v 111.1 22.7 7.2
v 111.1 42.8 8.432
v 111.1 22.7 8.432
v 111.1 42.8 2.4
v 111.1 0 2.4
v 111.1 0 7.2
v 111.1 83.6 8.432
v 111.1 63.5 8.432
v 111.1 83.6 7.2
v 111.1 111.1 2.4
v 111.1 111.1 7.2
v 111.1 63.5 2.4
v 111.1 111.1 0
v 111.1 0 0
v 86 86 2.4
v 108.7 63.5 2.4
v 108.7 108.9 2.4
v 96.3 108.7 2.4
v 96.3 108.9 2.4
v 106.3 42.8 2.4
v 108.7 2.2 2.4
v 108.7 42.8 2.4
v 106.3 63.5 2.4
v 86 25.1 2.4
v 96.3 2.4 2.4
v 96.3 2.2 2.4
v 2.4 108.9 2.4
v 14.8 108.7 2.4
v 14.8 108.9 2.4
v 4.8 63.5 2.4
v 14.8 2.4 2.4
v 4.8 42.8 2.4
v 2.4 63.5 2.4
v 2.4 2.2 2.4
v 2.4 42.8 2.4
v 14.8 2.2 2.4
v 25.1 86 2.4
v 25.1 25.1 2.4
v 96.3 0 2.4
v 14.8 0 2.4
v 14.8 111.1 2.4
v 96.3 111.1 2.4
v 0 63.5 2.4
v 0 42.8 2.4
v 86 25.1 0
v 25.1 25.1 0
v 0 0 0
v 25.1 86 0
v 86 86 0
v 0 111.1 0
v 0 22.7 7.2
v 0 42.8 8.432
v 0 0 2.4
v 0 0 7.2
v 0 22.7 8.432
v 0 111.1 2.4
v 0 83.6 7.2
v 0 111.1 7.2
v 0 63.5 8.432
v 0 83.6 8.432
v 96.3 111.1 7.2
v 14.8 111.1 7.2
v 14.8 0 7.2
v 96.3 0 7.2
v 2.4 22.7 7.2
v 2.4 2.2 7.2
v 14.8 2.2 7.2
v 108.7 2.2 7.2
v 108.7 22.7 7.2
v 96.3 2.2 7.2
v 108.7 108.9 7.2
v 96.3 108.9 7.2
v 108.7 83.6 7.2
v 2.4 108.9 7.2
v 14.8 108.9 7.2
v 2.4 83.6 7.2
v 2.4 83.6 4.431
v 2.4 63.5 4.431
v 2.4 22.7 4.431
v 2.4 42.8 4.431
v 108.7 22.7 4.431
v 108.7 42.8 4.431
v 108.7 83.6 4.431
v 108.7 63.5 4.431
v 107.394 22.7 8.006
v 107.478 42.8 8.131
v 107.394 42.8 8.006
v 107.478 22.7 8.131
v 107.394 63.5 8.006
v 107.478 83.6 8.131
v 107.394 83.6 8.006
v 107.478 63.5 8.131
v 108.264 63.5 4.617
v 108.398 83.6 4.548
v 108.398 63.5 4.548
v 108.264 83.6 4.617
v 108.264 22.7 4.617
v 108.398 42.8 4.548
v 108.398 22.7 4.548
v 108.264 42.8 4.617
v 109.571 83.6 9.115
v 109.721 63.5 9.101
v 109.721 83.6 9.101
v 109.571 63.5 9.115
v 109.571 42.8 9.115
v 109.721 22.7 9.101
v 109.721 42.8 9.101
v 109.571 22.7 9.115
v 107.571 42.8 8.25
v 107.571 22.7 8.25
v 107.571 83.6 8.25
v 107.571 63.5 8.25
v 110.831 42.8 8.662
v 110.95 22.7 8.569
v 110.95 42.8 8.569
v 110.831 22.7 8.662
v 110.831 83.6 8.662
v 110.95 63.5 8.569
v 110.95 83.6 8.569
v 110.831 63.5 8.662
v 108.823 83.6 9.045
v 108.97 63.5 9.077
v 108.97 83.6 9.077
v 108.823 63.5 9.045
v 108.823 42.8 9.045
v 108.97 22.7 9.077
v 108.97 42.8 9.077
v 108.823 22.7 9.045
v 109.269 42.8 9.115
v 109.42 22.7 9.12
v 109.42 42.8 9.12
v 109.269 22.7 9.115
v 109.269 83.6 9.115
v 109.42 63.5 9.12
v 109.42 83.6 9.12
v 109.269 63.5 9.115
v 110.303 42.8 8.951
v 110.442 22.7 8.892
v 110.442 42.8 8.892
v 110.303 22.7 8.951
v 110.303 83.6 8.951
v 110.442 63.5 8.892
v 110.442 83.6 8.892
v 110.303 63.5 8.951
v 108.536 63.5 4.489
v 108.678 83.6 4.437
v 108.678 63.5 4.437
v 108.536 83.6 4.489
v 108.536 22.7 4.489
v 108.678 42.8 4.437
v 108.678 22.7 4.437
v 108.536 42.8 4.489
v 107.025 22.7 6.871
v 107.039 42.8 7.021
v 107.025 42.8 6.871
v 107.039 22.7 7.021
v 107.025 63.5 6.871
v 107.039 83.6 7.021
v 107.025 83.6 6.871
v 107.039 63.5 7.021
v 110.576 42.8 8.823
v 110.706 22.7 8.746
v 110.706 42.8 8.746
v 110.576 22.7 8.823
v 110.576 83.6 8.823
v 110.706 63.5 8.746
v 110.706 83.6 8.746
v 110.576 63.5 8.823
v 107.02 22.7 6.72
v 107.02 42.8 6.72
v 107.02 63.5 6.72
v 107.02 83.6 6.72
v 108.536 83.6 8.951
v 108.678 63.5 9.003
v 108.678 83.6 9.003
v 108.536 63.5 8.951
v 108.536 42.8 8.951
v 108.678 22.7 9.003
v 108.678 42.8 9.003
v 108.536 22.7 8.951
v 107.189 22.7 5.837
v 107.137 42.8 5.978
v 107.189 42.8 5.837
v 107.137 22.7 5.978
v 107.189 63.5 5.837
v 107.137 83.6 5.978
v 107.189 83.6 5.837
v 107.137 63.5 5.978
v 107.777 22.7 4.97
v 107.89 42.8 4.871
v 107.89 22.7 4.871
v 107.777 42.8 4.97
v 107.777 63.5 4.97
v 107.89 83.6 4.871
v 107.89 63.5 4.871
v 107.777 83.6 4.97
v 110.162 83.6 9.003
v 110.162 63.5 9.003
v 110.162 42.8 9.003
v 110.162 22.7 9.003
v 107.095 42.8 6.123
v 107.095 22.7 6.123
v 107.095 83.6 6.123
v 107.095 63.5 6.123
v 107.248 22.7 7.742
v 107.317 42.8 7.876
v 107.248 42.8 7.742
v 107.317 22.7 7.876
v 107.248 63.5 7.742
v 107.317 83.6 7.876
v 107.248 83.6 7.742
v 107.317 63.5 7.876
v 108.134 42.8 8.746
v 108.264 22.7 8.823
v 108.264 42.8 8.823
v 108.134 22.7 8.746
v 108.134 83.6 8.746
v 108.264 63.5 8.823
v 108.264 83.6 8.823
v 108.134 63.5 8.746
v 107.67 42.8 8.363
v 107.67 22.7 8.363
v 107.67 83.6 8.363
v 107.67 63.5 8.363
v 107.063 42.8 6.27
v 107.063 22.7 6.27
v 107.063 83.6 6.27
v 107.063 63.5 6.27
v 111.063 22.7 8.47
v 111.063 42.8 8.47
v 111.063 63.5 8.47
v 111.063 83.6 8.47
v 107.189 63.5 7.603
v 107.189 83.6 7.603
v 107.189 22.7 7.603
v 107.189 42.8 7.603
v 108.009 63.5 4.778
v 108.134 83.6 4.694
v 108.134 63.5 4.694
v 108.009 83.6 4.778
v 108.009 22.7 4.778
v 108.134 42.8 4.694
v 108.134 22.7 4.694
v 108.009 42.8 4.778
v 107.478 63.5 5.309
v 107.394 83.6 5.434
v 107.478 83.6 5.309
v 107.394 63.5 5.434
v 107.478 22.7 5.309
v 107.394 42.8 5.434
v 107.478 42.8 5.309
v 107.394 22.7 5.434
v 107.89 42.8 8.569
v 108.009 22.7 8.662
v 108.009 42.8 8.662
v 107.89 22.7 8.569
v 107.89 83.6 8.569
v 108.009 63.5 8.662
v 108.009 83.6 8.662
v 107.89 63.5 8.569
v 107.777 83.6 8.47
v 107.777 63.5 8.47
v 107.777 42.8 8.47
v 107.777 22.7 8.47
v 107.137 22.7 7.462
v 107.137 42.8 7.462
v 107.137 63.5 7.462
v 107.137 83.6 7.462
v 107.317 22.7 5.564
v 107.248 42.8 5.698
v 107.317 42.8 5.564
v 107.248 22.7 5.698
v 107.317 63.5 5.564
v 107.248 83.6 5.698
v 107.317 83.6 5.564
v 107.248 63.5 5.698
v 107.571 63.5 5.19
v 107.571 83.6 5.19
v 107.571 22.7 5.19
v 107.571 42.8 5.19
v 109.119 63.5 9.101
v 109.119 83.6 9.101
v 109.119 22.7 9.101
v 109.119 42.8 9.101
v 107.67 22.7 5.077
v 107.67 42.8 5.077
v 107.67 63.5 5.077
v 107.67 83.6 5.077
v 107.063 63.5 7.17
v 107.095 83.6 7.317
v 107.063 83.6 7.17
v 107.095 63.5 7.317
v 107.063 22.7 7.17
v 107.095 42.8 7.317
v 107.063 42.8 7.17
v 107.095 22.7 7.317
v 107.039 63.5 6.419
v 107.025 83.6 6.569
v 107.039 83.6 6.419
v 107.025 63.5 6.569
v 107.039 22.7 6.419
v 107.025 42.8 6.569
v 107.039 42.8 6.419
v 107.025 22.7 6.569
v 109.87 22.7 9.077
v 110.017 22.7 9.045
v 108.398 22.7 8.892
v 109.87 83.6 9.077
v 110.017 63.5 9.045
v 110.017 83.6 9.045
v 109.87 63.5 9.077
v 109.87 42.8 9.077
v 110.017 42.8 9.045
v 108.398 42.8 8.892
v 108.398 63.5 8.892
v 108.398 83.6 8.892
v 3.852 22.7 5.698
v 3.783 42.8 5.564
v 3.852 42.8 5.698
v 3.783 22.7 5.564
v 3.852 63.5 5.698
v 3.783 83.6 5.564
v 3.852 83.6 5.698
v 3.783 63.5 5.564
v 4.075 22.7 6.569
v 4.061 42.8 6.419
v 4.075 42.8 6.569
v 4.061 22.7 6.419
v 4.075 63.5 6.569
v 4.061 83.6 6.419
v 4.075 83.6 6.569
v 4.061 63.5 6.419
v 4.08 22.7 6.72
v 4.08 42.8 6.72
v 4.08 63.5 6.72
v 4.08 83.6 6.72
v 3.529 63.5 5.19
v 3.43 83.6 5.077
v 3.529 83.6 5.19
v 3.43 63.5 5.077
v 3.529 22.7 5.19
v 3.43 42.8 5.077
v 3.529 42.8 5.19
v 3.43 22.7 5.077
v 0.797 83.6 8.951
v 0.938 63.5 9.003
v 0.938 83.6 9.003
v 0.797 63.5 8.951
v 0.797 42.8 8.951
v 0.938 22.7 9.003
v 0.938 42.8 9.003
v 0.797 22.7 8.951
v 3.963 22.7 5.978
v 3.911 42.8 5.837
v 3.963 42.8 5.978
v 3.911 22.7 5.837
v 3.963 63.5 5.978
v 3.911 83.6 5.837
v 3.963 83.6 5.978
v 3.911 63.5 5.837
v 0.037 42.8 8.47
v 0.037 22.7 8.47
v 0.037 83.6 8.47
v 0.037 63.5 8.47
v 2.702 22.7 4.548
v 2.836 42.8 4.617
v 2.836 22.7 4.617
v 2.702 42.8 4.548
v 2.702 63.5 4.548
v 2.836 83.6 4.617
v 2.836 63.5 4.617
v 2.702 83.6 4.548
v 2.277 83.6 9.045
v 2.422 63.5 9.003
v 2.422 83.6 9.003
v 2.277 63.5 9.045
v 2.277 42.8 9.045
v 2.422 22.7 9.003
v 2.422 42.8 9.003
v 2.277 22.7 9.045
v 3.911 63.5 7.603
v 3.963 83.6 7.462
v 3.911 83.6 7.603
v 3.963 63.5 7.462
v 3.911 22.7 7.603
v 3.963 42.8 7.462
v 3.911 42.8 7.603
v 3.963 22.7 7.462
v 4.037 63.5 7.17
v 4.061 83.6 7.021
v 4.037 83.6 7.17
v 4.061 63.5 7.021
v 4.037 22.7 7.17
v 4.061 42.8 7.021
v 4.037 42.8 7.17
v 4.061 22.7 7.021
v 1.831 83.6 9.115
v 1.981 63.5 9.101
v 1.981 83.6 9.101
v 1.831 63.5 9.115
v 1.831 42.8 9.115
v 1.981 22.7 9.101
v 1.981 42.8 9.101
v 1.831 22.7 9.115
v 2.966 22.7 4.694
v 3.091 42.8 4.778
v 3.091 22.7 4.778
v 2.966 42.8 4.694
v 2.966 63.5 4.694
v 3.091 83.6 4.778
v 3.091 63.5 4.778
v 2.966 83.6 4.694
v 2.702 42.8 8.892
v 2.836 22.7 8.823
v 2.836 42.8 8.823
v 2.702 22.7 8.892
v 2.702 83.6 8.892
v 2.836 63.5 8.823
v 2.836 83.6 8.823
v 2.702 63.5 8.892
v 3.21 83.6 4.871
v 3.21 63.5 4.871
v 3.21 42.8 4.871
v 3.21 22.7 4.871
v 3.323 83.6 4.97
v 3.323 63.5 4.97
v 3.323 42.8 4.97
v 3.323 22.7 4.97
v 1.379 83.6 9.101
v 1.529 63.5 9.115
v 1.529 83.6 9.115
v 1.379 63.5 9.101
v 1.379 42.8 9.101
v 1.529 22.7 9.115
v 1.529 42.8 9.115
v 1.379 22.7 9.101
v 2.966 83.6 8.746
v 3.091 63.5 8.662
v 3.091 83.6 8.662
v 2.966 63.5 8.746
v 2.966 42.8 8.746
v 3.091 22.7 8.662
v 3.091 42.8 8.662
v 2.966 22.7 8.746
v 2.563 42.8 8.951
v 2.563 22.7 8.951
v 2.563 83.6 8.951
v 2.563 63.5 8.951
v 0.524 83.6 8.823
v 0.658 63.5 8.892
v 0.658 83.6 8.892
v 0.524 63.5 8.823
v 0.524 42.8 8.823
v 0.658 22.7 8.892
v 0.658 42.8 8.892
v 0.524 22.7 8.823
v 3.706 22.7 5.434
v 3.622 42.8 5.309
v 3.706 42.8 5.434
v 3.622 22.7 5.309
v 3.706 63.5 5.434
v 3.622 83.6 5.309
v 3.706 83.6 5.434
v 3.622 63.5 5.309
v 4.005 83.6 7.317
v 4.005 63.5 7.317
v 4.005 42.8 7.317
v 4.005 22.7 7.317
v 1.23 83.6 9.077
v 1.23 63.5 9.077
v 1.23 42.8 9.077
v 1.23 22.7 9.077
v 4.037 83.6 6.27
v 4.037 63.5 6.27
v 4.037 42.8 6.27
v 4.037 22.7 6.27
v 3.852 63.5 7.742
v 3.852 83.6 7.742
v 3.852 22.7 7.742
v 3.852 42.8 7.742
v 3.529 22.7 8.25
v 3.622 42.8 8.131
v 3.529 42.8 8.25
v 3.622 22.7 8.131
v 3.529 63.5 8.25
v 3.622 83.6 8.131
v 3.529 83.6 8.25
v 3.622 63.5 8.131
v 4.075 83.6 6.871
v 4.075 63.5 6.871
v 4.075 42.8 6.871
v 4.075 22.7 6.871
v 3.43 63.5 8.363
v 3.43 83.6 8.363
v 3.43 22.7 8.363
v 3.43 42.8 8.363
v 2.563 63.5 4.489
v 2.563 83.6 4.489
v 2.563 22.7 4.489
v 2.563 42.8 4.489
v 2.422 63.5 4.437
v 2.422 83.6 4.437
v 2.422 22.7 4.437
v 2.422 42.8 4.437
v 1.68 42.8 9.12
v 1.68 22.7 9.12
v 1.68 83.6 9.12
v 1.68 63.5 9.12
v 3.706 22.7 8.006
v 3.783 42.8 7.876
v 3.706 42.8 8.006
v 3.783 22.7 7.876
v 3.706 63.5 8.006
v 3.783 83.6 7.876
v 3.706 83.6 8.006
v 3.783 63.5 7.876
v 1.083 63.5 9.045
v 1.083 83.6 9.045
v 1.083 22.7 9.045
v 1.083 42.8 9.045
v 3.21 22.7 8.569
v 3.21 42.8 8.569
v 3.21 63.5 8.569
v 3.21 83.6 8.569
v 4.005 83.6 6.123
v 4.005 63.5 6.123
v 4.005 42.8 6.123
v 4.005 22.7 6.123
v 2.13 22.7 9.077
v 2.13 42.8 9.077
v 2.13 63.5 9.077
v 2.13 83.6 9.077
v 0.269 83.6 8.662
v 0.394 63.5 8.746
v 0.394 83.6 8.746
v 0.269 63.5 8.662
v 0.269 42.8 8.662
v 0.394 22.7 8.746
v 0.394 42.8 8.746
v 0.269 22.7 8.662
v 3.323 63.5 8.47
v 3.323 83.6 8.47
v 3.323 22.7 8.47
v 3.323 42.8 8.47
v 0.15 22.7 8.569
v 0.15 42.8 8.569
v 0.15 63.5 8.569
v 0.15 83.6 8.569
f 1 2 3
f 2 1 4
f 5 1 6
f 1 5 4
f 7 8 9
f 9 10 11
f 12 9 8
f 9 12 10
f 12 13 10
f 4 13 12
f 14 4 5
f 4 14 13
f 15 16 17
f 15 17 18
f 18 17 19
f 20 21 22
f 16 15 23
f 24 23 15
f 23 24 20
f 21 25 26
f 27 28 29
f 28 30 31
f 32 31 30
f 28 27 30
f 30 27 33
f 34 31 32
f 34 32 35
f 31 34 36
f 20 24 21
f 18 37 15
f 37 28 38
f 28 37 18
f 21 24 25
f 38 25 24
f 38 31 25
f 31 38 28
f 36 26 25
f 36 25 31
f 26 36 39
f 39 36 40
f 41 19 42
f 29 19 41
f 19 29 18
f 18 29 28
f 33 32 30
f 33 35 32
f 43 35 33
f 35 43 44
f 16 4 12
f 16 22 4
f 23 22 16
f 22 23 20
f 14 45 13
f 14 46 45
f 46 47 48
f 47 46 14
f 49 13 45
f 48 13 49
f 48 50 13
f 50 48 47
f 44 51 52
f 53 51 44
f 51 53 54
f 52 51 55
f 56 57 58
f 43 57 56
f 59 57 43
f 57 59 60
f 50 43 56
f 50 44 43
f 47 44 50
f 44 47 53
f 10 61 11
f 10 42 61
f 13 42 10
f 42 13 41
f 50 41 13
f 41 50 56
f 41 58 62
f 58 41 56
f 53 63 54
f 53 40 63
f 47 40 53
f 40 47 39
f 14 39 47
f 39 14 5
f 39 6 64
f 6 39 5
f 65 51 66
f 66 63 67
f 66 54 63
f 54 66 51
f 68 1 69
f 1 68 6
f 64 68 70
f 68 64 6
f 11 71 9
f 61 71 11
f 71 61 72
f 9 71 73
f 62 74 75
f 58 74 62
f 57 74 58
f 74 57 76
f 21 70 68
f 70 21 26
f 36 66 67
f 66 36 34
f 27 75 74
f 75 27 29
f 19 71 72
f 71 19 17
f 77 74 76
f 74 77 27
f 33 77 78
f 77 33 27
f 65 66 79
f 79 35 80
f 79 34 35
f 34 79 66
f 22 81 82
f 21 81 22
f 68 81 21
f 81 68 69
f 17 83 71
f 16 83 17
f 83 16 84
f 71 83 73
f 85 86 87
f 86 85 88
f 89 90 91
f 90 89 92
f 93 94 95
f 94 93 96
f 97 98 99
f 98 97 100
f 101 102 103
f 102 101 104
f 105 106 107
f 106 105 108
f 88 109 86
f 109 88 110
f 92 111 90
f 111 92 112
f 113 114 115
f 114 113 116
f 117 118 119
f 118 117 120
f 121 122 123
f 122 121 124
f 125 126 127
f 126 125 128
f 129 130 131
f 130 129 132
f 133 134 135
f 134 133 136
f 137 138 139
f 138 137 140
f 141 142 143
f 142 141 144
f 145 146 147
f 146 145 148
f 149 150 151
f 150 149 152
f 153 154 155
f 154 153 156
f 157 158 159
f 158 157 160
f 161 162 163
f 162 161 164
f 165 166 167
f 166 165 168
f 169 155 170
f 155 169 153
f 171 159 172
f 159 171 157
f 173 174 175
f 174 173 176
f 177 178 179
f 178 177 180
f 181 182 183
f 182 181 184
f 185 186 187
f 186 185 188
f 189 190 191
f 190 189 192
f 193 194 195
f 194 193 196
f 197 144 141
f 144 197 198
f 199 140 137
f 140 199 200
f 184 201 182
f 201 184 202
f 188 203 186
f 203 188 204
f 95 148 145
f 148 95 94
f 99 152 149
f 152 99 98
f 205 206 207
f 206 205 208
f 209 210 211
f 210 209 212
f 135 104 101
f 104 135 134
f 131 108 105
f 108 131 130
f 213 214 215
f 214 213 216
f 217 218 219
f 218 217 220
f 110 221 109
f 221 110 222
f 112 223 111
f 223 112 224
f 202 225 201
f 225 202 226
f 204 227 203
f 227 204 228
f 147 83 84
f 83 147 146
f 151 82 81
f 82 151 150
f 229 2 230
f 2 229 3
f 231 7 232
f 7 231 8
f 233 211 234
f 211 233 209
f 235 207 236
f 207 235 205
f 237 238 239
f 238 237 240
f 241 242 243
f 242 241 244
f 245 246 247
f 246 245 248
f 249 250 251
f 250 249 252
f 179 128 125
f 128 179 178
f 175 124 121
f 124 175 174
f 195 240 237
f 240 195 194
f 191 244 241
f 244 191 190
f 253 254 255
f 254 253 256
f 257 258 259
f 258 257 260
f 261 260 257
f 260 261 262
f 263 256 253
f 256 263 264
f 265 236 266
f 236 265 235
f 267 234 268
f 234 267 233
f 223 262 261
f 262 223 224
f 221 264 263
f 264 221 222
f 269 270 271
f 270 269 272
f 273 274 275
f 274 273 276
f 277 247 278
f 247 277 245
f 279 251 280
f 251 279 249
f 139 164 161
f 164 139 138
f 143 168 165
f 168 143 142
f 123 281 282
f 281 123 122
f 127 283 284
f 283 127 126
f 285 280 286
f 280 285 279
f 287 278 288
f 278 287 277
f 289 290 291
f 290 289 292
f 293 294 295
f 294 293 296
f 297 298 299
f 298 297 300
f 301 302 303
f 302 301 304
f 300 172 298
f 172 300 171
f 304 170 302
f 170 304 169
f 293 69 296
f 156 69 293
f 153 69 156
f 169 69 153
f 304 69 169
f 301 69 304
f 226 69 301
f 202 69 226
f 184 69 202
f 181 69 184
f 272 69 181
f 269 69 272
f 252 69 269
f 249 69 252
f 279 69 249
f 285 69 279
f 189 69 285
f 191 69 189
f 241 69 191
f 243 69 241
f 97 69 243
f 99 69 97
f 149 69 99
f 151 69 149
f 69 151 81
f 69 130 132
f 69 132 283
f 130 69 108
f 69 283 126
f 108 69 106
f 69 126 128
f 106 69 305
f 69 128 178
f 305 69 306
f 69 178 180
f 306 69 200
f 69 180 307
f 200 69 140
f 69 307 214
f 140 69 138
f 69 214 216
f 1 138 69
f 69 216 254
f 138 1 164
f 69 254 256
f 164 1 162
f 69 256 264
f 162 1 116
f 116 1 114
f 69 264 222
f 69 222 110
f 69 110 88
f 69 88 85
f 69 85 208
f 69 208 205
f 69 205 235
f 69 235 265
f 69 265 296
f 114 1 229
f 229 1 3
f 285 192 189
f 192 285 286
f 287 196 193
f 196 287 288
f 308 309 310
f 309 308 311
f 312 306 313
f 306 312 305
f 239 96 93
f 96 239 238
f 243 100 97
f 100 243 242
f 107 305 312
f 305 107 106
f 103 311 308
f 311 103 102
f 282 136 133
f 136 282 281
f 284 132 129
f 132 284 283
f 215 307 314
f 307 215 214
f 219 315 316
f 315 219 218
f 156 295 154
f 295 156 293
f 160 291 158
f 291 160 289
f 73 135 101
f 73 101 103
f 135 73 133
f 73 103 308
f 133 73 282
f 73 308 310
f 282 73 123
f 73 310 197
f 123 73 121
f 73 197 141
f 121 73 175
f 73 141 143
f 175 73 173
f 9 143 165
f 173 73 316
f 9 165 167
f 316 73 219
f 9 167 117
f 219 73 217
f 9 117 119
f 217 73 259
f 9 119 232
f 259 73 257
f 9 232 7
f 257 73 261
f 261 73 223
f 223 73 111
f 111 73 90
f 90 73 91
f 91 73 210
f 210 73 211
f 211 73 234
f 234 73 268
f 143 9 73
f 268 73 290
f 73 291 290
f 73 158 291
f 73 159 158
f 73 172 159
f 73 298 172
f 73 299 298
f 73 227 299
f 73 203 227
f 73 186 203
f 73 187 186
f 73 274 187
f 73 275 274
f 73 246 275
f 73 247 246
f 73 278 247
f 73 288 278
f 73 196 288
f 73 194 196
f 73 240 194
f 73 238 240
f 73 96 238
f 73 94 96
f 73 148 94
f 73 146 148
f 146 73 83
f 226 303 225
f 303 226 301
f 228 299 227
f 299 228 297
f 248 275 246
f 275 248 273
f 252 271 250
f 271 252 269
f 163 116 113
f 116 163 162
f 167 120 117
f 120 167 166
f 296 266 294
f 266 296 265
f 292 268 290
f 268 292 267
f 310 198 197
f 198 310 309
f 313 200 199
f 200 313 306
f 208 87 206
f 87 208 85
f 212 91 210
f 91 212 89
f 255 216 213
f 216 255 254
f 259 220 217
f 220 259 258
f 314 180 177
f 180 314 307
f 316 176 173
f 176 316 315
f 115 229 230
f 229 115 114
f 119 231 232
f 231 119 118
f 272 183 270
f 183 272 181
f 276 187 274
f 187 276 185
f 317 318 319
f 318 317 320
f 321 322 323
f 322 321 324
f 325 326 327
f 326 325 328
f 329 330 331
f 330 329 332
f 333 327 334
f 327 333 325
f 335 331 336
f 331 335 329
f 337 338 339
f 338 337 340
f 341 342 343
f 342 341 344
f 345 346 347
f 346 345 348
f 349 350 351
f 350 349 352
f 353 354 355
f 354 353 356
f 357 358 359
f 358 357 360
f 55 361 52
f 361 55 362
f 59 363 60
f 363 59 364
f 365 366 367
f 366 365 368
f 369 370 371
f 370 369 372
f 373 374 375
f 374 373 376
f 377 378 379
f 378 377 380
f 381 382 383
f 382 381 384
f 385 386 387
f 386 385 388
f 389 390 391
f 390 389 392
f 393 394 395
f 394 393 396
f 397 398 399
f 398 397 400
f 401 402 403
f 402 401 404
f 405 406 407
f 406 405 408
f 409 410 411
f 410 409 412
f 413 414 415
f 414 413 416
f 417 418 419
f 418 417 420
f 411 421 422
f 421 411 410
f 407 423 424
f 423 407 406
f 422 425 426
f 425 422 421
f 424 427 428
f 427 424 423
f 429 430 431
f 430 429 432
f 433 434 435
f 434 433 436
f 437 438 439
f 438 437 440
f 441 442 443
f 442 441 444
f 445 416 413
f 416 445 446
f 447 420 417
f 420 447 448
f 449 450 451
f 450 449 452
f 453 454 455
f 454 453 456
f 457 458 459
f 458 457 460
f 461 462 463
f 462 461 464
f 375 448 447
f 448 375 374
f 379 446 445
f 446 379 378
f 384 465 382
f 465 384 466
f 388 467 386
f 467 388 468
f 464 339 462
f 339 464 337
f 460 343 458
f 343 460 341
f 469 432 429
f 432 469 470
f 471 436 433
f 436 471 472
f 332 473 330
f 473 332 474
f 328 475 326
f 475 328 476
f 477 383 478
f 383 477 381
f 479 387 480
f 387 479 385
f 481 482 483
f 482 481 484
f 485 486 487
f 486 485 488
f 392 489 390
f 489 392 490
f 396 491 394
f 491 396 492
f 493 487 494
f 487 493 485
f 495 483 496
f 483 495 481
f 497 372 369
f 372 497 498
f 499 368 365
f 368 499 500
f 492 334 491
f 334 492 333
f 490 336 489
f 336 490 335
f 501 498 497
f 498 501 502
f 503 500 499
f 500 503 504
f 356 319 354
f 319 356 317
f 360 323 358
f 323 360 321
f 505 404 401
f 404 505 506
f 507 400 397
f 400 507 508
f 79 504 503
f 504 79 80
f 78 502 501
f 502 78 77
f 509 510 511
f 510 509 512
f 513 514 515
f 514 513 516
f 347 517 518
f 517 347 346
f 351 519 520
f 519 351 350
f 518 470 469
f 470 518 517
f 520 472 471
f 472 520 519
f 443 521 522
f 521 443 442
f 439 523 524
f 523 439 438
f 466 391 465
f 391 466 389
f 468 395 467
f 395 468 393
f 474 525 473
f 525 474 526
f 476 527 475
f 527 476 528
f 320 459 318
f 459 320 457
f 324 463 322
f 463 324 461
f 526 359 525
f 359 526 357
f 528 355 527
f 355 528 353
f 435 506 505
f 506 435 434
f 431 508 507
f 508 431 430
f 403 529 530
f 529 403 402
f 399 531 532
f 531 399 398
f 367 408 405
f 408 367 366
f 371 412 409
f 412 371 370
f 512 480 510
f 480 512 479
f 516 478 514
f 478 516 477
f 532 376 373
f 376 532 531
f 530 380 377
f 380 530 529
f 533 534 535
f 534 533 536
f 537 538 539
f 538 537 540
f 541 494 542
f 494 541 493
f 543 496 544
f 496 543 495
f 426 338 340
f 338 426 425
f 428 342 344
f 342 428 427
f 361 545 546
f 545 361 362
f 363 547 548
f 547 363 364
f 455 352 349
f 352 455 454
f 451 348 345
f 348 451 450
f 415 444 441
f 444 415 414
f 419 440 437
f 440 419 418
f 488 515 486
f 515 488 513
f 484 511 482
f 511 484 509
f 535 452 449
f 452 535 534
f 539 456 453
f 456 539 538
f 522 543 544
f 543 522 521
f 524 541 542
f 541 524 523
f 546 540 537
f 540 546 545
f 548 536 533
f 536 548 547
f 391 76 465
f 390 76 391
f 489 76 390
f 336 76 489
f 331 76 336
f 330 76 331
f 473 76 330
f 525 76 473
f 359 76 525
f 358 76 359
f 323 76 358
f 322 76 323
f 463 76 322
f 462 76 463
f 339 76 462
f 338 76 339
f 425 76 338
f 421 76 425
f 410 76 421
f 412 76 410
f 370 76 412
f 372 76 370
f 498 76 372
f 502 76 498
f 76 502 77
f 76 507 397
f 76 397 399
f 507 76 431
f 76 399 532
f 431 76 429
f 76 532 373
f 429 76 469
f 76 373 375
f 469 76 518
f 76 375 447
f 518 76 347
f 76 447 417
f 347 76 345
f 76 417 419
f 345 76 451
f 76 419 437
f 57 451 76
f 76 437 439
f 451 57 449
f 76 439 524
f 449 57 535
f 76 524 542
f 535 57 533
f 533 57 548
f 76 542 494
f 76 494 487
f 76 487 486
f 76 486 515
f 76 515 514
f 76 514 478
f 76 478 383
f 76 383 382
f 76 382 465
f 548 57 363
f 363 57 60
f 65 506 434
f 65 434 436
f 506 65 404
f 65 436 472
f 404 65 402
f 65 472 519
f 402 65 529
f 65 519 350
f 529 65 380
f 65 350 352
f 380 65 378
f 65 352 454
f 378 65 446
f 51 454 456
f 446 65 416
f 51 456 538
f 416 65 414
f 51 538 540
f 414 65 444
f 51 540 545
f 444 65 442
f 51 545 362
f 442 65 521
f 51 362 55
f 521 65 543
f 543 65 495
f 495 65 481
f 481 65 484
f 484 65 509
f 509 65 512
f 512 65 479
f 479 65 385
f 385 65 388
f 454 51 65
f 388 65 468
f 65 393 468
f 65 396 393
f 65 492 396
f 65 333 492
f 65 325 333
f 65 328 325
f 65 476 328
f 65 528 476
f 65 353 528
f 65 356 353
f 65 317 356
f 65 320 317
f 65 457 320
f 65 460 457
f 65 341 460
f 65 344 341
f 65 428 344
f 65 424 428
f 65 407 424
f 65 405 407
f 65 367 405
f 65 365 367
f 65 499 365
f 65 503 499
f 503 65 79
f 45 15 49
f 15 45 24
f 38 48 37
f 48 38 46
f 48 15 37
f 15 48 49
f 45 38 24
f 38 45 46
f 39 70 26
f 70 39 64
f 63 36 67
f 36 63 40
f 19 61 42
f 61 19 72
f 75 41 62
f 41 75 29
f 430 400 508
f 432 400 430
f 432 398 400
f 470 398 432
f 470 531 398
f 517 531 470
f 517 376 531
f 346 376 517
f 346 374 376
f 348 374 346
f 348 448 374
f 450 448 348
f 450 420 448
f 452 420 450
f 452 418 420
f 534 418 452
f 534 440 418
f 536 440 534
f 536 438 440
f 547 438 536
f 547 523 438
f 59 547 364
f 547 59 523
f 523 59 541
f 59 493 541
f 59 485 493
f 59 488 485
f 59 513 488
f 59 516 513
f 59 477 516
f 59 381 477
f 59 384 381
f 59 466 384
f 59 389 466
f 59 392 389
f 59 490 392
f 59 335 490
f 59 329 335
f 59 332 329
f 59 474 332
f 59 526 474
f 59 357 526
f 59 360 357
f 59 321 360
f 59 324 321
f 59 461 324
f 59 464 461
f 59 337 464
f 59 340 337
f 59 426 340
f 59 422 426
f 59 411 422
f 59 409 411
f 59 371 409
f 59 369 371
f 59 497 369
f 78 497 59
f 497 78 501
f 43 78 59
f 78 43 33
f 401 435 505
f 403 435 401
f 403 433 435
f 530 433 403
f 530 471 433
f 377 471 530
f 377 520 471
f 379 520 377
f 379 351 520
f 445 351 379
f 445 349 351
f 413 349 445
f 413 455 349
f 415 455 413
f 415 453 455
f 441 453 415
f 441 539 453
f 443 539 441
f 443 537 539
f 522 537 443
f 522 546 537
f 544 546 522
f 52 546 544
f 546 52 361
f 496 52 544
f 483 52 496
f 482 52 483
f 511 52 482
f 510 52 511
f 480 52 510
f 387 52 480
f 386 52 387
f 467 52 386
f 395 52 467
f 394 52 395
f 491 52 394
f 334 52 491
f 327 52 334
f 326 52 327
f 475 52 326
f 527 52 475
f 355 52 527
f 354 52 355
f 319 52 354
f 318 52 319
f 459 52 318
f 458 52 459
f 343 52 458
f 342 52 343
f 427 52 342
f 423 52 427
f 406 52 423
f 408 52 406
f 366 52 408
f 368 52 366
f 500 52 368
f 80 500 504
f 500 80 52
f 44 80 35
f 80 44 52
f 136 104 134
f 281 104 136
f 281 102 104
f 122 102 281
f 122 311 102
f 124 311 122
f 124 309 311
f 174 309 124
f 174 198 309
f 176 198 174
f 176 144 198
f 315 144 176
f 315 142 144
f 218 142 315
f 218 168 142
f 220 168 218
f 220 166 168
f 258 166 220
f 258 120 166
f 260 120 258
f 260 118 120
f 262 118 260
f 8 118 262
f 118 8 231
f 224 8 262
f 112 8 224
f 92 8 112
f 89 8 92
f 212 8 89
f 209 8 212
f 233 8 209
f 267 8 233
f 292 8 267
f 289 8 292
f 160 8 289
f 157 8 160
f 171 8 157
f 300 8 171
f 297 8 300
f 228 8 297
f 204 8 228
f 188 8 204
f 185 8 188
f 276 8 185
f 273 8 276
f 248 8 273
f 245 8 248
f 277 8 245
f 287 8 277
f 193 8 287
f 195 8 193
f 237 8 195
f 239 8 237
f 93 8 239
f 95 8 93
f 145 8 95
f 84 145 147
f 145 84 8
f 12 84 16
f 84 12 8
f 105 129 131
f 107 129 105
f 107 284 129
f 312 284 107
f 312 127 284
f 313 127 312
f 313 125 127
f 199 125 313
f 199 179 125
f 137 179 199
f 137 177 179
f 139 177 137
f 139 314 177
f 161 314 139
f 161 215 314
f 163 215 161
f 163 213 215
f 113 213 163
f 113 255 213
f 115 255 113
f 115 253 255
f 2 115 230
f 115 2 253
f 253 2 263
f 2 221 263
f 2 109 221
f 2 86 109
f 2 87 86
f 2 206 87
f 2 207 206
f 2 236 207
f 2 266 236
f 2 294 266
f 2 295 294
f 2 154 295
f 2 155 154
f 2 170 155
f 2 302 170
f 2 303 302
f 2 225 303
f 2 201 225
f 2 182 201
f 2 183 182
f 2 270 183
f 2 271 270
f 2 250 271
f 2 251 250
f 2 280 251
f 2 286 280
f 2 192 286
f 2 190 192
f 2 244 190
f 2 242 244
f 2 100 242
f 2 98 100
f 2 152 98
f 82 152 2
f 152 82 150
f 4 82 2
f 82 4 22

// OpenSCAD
// Written by xoque (mwifall@gmail.com)
/**************************************
Lid for my custom Escape holder for chamber tiles
**************************************/

ChamberWidth=100;
ChamberHeight=75;
CurseLength=65;
CurseWidth=50;
CurseHeight=50;
TreasureWidth=30.1;
TreasureHeight=40;

lid(ChamberWidth,ChamberWidth,1.5,2.4,5);

module lid(LidWidth,LidLength, tol, Thickness, Edge)
{
    LidWidth=LidWidth+tol;
    LidLength=LidLength+tol;
    
    difference(){
        union(){
            //bottom structure
            cube([LidWidth+4*Thickness,LidLength+4*Thickness,Thickness]);
            
            //bottom and top walls
            translate([0,0,Thickness]) cube([LidWidth+Thickness*4,Thickness-.2,2*Thickness]);
            translate([0,LidLength+3*Thickness+.2,Thickness]) cube([LidWidth+Thickness*4,Thickness-.2,2*Thickness]);
            
            //side walls
            translate([0,0,Thickness]) cube([Thickness,LidLength+Thickness*4,2*Thickness]);
            translate([LidWidth+Thickness*3,0,Thickness]) cube([Thickness,LidLength+Thickness*4,2*Thickness]);

            //cylinders on side walls
            translate([LidWidth+4*Thickness-Thickness*0.7,Thickness+LidLength/5,4.5*Thickness-Thickness*1.7]) rotate([270,0,0]) cylinder($fn = 100, r = Thickness, h = 3*LidLength/5);
            translate([Thickness*0.7,Thickness+LidLength/5,4.5*Thickness-Thickness*1.7]) rotate([270,0,0]) cylinder($fn = 100, r = Thickness, h = 3*LidLength/5);
            }
    //Subtraction
    //hole in middle
    translate([0.2*LidWidth+2*Thickness, 0.2*LidLength+2*Thickness, 0]) cube([0.6*LidWidth, 0.6*LidLength, Thickness]);
    
    //Removing cutouts in top and bottom (non cylinder edges)
    translate([2*Edge+2*Thickness,0,Thickness]) cube([LidWidth-4*Edge,Thickness,2*Thickness]);
    translate([2*Edge+2*Thickness,LidLength+3*Thickness,Thickness]) cube([LidWidth-4*Edge,Thickness,3*Thickness]);

    //Removing cutouts in between cylinders
    translate([0,Thickness+2*LidLength/5-.2,Thickness]) cube([2*Thickness,LidLength/5+.4,3*Thickness]);
    translate([LidWidth+Thickness*2,Thickness+2*LidLength/5-.2,Thickness]) cube([2*Thickness,LidLength/5+.4,3*Thickness]);

    //Removing outside edges of cylinders
    translate([-Thickness,0,Thickness]) cube([Thickness,LidLength+Thickness*4,4*Thickness]);
    translate([LidWidth+Thickness*4,0,Thickness]) cube([Thickness,LidLength+Thickness*4,4*Thickness]);
}
}
